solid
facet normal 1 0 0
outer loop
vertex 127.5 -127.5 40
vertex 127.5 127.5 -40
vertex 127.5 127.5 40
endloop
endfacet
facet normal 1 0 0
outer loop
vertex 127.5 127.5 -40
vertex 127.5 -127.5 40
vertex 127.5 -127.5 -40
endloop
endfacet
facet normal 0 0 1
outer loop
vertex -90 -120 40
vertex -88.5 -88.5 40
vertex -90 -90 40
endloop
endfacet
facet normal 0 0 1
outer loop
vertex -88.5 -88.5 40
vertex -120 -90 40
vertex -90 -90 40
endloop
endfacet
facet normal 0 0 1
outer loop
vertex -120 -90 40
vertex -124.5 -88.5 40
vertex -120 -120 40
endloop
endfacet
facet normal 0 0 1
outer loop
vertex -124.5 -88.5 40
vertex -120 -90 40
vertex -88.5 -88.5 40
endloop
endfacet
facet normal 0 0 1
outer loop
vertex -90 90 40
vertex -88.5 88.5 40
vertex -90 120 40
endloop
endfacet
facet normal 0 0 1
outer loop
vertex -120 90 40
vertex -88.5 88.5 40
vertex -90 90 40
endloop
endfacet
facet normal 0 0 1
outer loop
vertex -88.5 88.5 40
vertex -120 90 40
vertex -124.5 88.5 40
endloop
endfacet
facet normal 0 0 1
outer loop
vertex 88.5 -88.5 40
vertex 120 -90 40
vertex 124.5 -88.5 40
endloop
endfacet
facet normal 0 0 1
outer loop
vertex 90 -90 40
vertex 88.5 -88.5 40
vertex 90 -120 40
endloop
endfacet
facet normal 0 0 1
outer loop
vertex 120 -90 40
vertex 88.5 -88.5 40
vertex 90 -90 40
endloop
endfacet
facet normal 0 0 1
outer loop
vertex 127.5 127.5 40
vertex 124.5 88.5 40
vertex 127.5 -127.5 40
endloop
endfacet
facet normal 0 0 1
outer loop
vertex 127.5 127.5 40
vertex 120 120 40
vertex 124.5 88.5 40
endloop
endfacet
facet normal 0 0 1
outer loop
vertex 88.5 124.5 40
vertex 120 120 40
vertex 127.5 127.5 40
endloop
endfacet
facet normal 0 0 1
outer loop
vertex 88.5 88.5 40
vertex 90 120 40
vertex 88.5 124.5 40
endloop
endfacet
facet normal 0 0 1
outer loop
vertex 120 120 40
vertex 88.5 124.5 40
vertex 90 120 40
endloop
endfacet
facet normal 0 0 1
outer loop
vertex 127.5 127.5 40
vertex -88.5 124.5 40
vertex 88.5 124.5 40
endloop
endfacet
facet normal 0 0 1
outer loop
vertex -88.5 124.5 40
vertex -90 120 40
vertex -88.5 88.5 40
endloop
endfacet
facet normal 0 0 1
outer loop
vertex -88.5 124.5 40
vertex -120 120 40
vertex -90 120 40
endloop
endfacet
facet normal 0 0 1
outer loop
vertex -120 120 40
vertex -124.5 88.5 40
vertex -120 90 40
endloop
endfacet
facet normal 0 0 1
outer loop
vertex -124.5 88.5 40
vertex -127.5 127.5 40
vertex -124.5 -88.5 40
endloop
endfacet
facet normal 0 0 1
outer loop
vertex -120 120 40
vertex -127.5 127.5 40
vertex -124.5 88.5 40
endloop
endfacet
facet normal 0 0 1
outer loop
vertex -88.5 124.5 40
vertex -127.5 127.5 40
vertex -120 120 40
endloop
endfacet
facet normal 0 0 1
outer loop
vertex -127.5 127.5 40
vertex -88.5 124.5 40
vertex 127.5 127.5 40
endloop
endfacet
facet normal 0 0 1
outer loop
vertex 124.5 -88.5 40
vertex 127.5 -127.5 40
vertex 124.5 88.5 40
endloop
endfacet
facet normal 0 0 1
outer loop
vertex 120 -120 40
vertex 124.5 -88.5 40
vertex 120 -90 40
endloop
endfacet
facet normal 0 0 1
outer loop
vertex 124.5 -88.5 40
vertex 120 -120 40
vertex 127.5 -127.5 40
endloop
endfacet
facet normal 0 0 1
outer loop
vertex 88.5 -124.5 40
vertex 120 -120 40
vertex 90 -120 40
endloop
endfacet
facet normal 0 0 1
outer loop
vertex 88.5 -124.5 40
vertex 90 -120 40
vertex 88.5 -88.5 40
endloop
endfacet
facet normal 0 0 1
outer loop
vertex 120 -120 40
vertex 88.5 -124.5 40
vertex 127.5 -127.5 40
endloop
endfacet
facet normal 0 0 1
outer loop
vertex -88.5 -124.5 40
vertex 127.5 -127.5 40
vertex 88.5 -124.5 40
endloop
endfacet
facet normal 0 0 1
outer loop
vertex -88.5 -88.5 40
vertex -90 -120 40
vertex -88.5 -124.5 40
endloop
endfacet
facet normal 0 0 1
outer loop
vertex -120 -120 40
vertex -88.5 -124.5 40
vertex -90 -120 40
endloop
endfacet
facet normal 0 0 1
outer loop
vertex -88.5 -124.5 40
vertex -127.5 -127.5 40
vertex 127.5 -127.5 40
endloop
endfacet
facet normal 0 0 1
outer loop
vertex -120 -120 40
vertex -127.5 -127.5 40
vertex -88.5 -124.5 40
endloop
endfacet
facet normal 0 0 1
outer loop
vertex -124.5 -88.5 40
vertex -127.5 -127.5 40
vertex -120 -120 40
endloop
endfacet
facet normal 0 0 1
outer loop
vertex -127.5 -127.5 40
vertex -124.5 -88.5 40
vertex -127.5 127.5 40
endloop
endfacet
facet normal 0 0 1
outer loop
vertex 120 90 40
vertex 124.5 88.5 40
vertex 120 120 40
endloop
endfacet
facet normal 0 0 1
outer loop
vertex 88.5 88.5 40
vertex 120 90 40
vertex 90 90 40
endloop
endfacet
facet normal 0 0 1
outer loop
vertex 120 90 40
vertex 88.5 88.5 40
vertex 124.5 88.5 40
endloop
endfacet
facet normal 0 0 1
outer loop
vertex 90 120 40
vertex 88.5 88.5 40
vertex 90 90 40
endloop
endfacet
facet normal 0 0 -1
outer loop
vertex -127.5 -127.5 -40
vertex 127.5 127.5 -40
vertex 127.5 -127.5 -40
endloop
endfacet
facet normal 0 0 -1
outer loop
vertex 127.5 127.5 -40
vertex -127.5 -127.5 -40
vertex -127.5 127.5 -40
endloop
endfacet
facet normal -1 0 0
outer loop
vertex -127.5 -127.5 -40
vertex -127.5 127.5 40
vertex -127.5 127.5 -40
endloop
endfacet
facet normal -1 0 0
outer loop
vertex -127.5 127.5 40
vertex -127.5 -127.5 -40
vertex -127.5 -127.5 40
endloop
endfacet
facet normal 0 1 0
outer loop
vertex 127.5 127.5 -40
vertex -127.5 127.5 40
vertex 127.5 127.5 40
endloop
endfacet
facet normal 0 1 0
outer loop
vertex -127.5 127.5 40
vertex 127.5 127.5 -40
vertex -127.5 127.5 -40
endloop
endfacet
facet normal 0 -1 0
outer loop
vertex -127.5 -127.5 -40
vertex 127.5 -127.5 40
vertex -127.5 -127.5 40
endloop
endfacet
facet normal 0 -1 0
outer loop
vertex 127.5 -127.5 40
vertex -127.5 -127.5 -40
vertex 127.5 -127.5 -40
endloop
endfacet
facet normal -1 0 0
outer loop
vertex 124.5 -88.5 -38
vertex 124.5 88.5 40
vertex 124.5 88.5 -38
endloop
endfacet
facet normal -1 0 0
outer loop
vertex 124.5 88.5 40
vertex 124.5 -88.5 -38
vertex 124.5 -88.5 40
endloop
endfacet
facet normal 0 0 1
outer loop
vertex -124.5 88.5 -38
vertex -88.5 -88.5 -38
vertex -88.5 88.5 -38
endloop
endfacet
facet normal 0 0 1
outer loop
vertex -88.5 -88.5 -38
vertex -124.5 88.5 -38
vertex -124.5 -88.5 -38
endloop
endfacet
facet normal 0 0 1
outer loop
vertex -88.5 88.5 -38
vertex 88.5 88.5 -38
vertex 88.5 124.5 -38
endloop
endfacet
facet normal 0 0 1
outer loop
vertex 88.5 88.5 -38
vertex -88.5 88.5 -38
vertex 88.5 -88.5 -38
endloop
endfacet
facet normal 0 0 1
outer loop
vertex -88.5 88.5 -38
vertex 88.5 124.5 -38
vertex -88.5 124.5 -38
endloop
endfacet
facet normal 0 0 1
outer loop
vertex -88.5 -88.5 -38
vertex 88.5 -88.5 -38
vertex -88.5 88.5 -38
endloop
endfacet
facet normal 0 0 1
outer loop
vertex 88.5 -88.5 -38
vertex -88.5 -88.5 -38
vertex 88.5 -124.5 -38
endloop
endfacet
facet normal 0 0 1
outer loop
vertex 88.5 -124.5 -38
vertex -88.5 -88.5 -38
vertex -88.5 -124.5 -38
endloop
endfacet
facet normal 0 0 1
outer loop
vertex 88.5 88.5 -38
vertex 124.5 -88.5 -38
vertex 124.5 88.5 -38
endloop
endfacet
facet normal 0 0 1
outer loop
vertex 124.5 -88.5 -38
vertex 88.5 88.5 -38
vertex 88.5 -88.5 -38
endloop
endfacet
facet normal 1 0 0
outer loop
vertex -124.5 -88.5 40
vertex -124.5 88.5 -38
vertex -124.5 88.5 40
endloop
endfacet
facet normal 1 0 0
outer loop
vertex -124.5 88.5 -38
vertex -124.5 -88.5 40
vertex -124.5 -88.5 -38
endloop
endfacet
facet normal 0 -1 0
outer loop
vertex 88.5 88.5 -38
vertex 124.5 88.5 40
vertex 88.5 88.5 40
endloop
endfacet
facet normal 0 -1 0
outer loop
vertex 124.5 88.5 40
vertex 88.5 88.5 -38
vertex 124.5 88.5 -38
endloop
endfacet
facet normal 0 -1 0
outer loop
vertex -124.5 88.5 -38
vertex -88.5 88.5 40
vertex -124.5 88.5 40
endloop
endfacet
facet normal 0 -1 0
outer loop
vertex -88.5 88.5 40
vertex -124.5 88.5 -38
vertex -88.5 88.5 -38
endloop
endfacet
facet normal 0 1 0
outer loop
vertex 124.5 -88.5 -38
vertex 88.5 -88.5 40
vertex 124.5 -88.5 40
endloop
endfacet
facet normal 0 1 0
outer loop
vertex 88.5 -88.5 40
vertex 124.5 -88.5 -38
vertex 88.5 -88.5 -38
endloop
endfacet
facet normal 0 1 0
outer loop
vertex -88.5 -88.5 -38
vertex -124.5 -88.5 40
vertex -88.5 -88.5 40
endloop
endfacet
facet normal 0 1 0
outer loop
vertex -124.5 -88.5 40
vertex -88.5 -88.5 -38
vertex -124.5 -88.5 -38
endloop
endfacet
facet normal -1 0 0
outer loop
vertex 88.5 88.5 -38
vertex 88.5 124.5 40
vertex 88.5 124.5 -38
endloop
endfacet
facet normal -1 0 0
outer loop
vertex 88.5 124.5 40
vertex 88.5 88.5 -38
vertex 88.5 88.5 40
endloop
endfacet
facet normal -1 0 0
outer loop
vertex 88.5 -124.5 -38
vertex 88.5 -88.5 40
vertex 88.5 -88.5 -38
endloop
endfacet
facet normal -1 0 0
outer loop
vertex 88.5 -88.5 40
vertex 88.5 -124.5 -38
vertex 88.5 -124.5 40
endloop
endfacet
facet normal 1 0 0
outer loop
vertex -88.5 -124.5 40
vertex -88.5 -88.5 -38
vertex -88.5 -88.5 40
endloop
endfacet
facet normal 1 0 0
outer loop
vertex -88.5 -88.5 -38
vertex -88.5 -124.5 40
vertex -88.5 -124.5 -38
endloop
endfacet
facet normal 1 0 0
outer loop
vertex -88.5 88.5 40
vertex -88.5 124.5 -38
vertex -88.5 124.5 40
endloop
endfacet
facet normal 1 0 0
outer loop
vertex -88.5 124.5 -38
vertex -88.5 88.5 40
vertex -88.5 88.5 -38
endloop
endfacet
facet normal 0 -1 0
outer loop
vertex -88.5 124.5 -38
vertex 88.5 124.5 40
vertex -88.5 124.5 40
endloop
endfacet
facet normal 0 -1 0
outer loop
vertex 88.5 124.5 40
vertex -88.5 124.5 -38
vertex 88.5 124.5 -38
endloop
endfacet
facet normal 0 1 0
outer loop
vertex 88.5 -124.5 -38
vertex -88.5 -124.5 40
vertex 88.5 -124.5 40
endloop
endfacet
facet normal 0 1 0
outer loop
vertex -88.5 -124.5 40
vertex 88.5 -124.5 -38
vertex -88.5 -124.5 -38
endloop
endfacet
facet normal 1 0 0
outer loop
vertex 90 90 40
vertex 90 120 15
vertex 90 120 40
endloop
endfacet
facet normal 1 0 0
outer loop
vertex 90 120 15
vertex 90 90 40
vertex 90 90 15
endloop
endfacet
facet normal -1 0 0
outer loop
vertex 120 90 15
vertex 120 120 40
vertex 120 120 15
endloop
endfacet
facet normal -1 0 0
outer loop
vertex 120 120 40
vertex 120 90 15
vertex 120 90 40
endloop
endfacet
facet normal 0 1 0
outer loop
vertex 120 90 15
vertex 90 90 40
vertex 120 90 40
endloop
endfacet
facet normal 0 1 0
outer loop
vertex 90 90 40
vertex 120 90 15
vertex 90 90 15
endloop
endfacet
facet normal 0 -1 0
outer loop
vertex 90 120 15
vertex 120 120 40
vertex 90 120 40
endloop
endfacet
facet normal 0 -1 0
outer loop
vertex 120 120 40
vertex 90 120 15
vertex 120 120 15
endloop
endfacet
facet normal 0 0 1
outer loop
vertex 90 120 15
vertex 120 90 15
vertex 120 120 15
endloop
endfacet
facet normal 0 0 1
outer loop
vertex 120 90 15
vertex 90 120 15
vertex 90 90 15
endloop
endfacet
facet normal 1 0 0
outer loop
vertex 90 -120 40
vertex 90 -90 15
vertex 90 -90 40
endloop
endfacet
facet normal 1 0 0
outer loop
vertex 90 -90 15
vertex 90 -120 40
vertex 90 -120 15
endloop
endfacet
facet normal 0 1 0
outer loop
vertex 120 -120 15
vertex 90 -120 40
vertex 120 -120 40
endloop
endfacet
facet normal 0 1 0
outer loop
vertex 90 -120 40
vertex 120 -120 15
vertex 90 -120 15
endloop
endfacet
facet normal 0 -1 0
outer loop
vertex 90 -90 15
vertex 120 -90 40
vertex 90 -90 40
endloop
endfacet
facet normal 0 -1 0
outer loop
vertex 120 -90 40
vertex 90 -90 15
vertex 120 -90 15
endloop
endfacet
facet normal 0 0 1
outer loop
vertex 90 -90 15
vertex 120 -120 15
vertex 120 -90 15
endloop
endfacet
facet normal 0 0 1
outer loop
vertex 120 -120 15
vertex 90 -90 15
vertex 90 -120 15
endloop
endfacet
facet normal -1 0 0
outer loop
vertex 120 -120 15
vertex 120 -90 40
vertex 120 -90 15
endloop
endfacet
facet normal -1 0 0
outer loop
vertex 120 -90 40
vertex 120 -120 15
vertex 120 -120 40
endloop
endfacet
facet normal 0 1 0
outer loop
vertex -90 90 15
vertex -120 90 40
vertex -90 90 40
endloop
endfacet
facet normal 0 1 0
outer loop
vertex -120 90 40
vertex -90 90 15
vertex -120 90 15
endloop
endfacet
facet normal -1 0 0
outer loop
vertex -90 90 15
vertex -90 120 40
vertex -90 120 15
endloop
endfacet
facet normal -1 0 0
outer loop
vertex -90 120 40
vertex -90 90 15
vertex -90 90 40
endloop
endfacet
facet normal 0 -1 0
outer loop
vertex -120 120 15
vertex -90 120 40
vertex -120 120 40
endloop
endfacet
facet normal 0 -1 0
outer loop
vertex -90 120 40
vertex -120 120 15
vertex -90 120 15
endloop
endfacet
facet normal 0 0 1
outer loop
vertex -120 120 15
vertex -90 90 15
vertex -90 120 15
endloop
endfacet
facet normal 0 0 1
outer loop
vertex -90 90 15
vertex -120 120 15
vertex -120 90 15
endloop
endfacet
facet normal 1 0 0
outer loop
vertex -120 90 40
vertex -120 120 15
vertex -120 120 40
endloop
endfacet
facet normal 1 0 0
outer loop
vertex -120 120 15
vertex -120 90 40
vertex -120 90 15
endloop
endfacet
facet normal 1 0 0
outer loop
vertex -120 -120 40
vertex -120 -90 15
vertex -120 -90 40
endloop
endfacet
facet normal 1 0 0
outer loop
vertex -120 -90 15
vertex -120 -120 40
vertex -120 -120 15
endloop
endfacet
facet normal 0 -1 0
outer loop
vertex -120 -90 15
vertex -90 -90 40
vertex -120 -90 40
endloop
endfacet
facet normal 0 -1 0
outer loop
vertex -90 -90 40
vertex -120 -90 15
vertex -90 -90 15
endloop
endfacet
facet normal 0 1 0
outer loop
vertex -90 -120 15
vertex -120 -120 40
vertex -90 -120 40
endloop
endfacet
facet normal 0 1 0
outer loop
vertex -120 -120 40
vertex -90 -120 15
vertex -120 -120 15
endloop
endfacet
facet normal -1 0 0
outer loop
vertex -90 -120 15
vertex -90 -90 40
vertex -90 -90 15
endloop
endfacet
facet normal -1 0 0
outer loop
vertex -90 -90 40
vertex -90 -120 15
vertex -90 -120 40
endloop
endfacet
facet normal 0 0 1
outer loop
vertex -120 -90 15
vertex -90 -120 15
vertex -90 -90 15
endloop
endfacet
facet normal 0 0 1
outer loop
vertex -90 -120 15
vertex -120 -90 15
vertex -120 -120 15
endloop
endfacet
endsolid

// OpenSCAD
units2 = 6;
length_in_units2 = 6;
module arm(length_in_units2){
translate([30*(units2+2)/2-15,0,0]) cube([30,30*(length_in_units2+2),30], center=true);
}

module bottom_frame() {
	difference(){
		cube([30*(units2+2.5),30*(units2+2.5),80], center=true);
		translate([0,0,2]) cube([30*(units2+2.5)-6,30*(units2)-3,80], center=true);
		translate([0,0,2]) cube([30*(units2)-3,30*(units2+2.5)-6,80], center=true);
		translate([0,(units2-2.5)*30,(units2-1.5)*30]) rotate([90,0,0]) arm(length_in_units2);
		translate([0,-(units2-2.5)*30,(units2-1.5)*30]) rotate([90,0,0]) arm(length_in_units2);
		translate([0,(units2-2.5)*30,(units2-1.5)*30]) rotate([90,180,0]) arm(length_in_units2);
		translate([0,-(units2-2.5)*30,((length_in_units2-1.5)*30)]) rotate([90,0,180]) arm(length_in_units2);
	}
}

bottom_frame();
